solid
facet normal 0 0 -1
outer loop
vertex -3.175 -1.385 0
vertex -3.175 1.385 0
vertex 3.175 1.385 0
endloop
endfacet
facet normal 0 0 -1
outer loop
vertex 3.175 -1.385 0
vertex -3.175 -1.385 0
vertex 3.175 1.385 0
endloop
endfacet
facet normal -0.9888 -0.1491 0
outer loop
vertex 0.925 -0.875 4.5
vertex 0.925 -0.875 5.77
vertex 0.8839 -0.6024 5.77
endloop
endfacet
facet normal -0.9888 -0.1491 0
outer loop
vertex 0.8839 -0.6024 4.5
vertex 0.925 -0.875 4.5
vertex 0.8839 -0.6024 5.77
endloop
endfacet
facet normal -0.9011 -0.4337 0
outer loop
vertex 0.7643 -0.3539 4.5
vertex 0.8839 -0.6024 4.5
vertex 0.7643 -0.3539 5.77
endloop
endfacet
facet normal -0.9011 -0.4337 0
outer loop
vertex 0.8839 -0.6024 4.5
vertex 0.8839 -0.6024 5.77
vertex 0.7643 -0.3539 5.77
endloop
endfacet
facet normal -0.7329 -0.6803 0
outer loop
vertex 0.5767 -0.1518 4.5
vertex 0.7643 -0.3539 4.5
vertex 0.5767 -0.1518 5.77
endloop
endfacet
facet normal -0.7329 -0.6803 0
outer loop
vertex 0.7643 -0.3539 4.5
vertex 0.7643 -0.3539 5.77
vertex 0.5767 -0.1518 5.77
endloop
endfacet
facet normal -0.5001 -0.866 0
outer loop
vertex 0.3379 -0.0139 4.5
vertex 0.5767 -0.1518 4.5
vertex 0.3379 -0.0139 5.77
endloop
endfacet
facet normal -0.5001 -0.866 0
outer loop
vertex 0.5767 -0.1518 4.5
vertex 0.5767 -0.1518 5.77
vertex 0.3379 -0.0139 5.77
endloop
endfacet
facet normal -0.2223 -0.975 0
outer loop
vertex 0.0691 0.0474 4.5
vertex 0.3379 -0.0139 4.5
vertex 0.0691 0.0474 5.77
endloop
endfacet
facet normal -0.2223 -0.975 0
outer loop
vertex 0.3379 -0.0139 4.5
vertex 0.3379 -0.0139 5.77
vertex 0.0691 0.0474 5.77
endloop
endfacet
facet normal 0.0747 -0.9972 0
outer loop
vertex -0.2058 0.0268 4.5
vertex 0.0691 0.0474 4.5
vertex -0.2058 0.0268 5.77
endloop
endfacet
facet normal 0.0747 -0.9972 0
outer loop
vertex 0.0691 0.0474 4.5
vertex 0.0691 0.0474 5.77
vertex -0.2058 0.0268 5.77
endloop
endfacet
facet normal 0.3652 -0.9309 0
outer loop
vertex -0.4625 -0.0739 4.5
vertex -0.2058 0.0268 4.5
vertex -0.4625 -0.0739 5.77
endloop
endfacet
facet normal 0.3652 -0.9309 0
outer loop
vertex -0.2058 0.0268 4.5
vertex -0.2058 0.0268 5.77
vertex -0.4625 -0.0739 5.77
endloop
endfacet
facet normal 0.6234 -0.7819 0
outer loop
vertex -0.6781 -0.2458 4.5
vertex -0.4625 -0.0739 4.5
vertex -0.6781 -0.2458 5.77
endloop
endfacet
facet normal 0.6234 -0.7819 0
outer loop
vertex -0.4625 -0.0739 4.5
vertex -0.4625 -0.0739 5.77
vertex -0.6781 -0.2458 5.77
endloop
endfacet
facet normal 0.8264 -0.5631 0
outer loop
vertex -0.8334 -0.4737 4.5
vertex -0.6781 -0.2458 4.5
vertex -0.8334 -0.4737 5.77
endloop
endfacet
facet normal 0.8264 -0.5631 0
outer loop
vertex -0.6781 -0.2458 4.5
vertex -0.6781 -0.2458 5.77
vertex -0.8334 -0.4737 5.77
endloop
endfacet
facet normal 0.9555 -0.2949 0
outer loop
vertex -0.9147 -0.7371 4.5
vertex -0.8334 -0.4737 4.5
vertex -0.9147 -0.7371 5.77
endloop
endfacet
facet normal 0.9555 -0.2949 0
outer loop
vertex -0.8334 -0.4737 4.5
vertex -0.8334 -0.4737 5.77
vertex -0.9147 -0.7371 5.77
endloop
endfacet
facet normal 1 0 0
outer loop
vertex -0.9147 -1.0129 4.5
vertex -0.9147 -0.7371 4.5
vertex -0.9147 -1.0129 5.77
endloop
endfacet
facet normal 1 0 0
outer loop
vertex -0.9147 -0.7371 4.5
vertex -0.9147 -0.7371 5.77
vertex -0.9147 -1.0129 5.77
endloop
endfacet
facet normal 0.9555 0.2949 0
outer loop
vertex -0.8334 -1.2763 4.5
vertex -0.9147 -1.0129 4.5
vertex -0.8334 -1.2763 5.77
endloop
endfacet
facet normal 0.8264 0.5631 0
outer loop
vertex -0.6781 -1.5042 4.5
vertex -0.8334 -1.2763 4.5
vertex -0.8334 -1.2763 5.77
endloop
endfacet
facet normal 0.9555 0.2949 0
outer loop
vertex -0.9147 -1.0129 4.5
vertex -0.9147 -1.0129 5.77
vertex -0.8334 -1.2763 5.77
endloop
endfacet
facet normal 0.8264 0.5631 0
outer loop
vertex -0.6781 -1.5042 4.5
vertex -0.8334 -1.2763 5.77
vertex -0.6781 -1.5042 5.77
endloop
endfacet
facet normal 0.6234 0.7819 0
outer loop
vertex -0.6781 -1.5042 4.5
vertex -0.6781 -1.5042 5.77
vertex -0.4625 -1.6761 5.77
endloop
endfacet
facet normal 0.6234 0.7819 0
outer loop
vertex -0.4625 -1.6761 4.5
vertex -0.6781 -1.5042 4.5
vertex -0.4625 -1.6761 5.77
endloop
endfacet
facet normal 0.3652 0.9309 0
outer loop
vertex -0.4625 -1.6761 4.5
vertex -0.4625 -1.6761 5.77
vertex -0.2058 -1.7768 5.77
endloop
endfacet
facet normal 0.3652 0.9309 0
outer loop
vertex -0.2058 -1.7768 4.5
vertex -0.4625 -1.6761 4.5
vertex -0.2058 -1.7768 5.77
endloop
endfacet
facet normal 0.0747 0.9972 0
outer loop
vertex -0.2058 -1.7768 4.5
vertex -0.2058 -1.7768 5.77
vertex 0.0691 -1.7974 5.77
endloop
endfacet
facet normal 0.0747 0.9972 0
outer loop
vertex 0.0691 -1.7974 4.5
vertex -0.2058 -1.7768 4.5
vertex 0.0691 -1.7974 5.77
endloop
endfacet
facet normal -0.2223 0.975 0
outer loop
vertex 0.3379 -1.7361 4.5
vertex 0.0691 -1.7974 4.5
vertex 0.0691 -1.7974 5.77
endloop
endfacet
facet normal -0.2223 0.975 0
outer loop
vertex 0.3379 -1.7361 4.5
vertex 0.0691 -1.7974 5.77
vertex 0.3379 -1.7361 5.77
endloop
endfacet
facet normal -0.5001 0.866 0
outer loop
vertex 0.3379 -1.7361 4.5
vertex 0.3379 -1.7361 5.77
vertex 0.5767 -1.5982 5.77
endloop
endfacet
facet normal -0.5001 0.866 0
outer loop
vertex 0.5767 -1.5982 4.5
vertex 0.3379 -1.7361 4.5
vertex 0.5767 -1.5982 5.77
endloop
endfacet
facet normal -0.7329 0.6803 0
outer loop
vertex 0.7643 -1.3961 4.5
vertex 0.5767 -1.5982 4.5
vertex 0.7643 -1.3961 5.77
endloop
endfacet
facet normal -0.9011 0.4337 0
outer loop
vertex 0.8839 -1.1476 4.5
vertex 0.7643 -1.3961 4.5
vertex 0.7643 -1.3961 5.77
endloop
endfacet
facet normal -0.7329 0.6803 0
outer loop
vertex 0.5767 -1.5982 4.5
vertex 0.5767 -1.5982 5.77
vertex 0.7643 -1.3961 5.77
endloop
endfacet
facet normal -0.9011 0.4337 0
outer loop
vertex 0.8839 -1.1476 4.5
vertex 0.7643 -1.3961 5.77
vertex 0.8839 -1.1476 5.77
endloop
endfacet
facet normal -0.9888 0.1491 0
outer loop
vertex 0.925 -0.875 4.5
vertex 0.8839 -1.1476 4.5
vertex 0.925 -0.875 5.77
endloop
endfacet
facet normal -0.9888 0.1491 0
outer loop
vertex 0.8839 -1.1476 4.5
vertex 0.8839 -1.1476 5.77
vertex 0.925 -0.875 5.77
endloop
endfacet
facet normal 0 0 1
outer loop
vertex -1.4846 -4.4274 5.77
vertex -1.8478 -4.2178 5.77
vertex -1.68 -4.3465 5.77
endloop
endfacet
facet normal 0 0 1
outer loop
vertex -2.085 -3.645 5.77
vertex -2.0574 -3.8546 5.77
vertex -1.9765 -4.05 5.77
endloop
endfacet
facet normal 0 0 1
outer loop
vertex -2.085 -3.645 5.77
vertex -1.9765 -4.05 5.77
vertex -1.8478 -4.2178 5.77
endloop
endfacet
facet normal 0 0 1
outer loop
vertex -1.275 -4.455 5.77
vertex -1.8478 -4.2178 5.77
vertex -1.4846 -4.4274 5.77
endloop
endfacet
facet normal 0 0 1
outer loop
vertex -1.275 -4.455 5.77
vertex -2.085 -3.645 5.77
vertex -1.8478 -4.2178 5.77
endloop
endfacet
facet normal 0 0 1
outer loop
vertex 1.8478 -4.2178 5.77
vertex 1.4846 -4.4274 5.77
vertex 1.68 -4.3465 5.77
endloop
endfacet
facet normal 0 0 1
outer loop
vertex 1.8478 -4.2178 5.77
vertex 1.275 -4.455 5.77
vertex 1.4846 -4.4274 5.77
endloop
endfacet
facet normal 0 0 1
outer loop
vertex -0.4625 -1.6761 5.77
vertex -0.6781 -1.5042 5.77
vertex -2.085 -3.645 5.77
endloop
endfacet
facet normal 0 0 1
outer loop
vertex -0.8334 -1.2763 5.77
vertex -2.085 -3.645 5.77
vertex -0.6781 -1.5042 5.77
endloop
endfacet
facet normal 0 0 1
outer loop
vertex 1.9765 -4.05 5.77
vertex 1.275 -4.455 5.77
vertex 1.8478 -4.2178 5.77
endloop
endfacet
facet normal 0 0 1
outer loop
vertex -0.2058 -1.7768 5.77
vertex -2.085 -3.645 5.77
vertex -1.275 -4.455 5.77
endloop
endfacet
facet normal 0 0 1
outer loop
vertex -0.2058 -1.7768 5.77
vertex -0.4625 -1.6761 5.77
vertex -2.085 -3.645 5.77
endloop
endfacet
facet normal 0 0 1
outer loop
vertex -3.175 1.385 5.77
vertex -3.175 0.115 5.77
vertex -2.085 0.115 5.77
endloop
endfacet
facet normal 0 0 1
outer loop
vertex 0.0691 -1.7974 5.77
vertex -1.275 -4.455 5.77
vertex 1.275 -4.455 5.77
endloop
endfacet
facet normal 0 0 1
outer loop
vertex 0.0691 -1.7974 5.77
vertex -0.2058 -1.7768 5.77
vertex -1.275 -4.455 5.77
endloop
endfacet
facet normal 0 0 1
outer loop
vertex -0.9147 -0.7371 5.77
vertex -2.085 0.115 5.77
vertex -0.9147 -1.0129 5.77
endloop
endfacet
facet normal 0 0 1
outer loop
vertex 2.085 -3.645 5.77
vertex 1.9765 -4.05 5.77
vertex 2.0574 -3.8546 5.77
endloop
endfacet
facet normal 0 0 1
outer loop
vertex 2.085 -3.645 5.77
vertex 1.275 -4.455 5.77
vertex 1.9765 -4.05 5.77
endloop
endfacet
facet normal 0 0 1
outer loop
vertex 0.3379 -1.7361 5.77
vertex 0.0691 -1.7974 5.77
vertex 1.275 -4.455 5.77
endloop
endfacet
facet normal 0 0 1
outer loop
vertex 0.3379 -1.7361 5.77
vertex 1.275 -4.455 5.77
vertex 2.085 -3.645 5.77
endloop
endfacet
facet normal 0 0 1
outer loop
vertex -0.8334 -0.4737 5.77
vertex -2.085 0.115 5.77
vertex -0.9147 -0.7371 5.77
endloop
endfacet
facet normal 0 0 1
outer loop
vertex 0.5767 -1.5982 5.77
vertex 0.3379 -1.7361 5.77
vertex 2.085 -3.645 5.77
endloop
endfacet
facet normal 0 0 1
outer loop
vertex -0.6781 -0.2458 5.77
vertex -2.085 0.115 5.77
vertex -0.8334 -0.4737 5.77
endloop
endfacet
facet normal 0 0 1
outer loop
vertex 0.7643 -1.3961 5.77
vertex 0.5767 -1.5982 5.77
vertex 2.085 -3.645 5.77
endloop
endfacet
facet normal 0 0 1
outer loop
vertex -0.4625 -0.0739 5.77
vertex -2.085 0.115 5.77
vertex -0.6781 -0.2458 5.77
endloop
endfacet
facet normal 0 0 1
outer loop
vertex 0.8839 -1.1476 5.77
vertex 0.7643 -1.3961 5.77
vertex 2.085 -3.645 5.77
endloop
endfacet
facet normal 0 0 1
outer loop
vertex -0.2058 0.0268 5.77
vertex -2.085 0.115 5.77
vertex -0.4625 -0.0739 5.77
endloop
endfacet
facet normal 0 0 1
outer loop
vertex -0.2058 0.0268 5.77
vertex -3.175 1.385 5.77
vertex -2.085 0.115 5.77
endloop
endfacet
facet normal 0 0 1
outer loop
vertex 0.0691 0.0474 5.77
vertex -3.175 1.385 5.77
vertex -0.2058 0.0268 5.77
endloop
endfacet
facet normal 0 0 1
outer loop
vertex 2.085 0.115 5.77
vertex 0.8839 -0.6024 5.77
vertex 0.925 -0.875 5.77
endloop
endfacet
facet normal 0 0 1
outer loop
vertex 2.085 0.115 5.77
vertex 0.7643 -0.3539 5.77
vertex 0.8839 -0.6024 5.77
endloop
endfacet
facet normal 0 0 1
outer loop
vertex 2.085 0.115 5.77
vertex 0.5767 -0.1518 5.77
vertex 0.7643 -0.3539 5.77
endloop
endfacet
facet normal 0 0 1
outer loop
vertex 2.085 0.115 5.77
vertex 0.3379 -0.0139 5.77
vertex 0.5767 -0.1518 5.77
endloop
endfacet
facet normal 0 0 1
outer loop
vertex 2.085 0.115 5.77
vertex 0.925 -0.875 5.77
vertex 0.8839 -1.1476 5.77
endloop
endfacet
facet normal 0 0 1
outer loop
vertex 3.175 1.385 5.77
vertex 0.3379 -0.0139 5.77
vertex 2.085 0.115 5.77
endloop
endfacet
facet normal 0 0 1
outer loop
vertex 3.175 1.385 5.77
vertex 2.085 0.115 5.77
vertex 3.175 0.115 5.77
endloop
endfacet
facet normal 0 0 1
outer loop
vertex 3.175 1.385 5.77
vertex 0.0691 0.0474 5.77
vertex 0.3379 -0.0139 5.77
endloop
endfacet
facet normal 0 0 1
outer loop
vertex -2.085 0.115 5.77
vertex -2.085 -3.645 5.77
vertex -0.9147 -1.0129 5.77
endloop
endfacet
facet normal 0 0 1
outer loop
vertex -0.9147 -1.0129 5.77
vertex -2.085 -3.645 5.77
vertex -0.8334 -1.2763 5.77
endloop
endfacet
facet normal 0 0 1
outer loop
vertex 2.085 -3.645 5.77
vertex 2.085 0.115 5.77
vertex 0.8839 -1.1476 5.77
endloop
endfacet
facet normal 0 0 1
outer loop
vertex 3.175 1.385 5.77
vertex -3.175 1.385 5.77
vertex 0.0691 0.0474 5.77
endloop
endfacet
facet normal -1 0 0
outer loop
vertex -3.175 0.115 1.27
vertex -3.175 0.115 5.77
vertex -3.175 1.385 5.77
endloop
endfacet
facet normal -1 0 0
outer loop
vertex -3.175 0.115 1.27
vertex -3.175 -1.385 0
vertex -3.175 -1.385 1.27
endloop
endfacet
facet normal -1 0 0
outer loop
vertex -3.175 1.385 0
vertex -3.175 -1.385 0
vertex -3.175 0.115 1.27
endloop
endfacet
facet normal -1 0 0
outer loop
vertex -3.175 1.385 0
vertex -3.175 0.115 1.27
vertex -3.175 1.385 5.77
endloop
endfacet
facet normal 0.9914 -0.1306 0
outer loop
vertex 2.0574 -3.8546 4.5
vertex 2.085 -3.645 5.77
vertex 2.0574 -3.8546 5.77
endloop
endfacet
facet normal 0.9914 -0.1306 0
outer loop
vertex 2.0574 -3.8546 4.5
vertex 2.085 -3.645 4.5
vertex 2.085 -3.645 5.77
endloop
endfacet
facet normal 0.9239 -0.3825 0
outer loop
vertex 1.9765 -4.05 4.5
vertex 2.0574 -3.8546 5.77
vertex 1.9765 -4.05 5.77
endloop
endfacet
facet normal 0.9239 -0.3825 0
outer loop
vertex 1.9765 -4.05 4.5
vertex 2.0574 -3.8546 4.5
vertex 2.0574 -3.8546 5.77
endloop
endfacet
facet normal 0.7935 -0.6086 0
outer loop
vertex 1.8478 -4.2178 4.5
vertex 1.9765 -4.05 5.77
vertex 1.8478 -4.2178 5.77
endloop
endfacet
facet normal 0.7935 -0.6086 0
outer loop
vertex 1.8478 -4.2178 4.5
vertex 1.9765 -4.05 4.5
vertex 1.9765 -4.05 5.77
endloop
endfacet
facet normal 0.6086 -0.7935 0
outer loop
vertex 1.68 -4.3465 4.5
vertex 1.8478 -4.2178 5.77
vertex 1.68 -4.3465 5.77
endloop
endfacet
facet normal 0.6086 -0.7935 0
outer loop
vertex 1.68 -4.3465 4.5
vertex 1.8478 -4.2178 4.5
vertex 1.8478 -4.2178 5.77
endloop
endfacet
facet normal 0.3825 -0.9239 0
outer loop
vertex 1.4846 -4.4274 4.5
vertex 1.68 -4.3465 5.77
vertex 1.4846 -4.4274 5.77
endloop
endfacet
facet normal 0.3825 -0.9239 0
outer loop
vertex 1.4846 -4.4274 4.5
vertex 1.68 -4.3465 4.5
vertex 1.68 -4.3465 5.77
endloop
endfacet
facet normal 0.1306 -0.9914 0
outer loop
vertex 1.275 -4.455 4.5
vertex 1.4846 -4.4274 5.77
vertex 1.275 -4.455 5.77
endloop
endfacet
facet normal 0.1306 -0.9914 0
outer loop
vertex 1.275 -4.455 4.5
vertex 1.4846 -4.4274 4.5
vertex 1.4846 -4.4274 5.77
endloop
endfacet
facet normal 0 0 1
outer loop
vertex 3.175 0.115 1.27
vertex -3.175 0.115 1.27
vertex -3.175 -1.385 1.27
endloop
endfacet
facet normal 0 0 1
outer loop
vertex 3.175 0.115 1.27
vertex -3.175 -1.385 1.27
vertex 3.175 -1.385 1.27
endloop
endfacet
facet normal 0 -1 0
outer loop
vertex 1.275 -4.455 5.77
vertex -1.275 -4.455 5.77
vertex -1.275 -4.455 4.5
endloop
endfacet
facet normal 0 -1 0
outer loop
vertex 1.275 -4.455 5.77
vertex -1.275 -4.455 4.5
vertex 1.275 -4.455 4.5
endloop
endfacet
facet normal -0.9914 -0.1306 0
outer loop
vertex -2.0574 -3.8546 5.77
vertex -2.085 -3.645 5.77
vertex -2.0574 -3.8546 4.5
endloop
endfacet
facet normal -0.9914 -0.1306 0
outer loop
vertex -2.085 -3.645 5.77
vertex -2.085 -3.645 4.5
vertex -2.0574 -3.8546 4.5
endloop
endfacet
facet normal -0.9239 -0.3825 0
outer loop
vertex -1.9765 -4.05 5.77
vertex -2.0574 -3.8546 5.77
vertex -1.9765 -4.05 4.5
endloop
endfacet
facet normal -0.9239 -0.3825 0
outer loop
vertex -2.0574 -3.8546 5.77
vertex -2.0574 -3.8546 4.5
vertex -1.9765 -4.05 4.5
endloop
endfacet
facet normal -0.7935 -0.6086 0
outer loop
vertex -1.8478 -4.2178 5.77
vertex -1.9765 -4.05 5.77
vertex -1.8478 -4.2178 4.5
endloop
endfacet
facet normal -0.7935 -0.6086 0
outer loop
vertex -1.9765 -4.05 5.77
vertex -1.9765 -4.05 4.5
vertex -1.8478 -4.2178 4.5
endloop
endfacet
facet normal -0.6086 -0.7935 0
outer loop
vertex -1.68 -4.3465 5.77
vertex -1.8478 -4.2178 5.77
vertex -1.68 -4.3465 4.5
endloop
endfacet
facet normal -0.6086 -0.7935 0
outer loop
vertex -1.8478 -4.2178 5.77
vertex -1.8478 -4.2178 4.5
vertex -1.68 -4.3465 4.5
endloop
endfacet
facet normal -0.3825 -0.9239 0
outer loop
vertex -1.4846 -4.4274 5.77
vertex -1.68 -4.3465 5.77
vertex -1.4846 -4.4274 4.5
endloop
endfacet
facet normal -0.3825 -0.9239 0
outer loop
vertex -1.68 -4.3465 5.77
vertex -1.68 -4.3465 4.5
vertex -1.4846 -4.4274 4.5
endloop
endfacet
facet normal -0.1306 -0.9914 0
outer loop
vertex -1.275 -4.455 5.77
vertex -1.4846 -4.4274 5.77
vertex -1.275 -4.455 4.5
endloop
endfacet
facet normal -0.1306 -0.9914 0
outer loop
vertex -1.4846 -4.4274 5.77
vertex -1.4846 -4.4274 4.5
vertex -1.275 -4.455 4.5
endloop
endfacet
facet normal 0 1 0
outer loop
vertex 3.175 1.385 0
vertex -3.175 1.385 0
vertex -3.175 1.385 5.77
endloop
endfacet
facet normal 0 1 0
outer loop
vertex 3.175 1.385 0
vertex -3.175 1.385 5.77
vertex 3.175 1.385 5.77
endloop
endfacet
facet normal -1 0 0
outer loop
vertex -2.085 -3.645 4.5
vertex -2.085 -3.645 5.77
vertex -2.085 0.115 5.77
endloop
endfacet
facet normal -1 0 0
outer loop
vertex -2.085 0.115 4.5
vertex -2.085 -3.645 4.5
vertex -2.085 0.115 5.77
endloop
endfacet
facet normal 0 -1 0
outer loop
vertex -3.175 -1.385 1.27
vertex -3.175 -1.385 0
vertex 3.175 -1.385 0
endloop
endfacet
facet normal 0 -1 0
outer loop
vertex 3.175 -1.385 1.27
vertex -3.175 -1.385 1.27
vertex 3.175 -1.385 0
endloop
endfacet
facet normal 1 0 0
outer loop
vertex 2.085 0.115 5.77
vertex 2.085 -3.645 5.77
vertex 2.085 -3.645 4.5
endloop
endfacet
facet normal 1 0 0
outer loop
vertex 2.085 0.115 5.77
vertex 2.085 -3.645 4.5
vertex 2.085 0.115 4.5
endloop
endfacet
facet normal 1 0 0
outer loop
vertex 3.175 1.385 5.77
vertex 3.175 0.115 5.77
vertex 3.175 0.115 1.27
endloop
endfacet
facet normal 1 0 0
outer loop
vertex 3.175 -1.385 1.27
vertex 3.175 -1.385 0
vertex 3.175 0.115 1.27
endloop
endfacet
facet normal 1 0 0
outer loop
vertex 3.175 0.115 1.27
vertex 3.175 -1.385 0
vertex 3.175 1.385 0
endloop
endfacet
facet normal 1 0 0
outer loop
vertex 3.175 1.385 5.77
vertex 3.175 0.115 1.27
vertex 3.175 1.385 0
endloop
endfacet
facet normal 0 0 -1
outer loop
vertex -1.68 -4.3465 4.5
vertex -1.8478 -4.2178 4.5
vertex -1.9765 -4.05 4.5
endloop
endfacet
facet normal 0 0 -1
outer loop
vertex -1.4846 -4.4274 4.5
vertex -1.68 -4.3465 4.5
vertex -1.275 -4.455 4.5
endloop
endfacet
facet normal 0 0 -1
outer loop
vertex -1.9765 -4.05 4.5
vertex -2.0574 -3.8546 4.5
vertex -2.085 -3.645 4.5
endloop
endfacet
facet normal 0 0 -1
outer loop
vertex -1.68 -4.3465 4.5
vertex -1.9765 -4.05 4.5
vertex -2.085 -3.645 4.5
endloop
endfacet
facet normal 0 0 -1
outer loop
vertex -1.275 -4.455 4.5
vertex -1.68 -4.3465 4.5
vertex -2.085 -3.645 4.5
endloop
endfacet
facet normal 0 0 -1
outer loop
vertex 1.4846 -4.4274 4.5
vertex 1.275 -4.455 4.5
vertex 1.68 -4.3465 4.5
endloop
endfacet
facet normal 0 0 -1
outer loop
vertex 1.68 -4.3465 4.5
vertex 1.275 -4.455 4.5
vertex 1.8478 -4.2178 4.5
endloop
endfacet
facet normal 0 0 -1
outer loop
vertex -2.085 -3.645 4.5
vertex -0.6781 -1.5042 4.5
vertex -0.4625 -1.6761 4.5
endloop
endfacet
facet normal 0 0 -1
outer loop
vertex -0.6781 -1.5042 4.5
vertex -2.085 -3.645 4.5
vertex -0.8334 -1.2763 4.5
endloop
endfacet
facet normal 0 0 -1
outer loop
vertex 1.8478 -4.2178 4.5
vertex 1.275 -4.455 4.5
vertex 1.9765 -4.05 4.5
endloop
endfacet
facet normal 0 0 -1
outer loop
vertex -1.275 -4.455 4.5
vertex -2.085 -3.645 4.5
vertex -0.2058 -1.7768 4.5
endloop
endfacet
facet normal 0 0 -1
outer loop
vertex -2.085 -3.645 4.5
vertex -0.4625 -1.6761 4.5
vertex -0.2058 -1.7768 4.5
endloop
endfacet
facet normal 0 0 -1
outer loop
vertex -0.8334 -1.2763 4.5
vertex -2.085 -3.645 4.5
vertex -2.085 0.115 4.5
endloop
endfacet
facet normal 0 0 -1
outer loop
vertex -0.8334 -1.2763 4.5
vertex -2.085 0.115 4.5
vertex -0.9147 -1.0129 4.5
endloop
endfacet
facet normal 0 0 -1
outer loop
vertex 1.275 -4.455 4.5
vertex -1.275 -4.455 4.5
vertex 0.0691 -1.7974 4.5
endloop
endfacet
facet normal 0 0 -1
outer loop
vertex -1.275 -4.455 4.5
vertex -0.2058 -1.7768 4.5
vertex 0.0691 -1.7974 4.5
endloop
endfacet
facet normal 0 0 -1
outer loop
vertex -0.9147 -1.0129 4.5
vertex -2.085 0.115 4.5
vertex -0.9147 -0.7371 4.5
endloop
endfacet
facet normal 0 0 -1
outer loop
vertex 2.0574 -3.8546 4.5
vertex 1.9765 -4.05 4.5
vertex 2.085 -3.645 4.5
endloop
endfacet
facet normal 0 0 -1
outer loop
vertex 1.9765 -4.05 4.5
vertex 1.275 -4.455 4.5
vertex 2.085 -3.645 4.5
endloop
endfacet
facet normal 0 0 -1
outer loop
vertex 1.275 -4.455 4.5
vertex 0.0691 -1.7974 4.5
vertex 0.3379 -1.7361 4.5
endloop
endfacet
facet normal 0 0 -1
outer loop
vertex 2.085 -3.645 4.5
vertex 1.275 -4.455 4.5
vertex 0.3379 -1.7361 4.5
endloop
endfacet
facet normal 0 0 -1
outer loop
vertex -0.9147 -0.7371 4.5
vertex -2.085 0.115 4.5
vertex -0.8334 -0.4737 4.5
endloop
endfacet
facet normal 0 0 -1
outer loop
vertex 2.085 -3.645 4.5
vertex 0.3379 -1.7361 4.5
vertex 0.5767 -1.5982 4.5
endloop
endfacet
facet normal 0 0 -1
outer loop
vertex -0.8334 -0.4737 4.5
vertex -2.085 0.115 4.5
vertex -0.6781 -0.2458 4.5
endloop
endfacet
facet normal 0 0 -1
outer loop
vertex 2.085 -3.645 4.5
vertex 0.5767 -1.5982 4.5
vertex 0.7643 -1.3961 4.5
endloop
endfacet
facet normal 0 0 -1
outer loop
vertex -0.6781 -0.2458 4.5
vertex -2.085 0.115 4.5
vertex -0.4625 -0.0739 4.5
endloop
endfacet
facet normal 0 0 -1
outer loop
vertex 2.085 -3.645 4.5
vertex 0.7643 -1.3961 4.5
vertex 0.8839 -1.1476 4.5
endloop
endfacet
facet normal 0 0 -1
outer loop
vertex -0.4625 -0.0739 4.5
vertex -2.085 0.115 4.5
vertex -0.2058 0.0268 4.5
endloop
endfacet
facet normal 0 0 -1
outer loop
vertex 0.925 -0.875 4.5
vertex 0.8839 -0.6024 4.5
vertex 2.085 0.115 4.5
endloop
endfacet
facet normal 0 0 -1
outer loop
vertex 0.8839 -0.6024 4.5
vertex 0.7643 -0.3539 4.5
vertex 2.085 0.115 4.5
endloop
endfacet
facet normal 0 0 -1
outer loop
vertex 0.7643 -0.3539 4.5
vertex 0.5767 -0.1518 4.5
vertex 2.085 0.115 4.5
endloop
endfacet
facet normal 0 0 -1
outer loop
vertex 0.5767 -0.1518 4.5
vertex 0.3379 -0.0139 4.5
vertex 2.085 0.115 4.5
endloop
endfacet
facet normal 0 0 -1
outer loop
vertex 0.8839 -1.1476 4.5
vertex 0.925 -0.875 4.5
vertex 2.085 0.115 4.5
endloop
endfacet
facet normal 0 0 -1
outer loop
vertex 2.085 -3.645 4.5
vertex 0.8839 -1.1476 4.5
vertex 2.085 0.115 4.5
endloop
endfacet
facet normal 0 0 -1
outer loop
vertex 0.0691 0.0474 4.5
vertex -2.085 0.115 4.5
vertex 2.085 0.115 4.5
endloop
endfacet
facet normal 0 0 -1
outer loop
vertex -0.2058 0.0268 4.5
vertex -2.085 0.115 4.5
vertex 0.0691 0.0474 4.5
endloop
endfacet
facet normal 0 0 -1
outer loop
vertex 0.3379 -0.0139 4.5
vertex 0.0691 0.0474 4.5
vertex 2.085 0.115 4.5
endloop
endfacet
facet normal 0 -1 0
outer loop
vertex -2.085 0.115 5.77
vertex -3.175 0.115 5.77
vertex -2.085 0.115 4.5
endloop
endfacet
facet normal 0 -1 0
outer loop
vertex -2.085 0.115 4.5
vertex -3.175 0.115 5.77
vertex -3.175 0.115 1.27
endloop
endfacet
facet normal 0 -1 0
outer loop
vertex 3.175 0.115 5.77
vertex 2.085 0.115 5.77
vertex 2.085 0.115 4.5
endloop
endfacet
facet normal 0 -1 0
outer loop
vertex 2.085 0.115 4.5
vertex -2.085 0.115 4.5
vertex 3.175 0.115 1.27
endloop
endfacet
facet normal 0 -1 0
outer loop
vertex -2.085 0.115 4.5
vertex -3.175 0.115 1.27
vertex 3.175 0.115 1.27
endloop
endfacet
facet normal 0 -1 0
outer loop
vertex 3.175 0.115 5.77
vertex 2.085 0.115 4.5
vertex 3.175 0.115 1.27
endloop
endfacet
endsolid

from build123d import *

# Parameters (mm, degrees)
SKETCH1_W      = 6.35
SKETCH1_H      = 2.77
EXTRUDE1_DEPTH = 1.27
SKETCH2_W      = 6.35
SKETCH2_H      = 1.27
EXTRUDE2_DEPTH = 4.5
SKETCH3_W      = 4.17
SKETCH3_H      = 4.57
SKETCH3_R      = 0.925
EXTRUDE3_DEPTH = 1.27
FILLET1_R      = 0.81


with BuildPart() as part:
    # Sketch1 → Extrude1 (new body)
    with BuildSketch(Plane.XY):
        Rectangle(SKETCH1_W, SKETCH1_H)
    extrude(amount=EXTRUDE1_DEPTH)

    # Sketch2 → Extrude2 (add)
    with BuildSketch(Plane.XY.offset(1.27)):
        with Locations((0, 0.75)):
            Rectangle(SKETCH2_W, SKETCH2_H)
    extrude(amount=EXTRUDE2_DEPTH)

    # Sketch3 → Extrude3 (add)
    with BuildSketch(Plane.XY.offset(5.77)):
        with Locations((0, -2.17)):
            Rectangle(SKETCH3_W, SKETCH3_H)
        with Locations((0, -0.875)):
            Circle(SKETCH3_R, mode=Mode.SUBTRACT)
    extrude(amount=-EXTRUDE3_DEPTH)

    # Fillet1
    fillet1_edges = [part.edges().sort_by_distance(p)[0] for p in [
        (-2.085, -4.455, 5.135),
        (2.085, -4.455, 5.135),
    ]]
    fillet(fillet1_edges, radius=FILLET1_R)


solid = part.part
